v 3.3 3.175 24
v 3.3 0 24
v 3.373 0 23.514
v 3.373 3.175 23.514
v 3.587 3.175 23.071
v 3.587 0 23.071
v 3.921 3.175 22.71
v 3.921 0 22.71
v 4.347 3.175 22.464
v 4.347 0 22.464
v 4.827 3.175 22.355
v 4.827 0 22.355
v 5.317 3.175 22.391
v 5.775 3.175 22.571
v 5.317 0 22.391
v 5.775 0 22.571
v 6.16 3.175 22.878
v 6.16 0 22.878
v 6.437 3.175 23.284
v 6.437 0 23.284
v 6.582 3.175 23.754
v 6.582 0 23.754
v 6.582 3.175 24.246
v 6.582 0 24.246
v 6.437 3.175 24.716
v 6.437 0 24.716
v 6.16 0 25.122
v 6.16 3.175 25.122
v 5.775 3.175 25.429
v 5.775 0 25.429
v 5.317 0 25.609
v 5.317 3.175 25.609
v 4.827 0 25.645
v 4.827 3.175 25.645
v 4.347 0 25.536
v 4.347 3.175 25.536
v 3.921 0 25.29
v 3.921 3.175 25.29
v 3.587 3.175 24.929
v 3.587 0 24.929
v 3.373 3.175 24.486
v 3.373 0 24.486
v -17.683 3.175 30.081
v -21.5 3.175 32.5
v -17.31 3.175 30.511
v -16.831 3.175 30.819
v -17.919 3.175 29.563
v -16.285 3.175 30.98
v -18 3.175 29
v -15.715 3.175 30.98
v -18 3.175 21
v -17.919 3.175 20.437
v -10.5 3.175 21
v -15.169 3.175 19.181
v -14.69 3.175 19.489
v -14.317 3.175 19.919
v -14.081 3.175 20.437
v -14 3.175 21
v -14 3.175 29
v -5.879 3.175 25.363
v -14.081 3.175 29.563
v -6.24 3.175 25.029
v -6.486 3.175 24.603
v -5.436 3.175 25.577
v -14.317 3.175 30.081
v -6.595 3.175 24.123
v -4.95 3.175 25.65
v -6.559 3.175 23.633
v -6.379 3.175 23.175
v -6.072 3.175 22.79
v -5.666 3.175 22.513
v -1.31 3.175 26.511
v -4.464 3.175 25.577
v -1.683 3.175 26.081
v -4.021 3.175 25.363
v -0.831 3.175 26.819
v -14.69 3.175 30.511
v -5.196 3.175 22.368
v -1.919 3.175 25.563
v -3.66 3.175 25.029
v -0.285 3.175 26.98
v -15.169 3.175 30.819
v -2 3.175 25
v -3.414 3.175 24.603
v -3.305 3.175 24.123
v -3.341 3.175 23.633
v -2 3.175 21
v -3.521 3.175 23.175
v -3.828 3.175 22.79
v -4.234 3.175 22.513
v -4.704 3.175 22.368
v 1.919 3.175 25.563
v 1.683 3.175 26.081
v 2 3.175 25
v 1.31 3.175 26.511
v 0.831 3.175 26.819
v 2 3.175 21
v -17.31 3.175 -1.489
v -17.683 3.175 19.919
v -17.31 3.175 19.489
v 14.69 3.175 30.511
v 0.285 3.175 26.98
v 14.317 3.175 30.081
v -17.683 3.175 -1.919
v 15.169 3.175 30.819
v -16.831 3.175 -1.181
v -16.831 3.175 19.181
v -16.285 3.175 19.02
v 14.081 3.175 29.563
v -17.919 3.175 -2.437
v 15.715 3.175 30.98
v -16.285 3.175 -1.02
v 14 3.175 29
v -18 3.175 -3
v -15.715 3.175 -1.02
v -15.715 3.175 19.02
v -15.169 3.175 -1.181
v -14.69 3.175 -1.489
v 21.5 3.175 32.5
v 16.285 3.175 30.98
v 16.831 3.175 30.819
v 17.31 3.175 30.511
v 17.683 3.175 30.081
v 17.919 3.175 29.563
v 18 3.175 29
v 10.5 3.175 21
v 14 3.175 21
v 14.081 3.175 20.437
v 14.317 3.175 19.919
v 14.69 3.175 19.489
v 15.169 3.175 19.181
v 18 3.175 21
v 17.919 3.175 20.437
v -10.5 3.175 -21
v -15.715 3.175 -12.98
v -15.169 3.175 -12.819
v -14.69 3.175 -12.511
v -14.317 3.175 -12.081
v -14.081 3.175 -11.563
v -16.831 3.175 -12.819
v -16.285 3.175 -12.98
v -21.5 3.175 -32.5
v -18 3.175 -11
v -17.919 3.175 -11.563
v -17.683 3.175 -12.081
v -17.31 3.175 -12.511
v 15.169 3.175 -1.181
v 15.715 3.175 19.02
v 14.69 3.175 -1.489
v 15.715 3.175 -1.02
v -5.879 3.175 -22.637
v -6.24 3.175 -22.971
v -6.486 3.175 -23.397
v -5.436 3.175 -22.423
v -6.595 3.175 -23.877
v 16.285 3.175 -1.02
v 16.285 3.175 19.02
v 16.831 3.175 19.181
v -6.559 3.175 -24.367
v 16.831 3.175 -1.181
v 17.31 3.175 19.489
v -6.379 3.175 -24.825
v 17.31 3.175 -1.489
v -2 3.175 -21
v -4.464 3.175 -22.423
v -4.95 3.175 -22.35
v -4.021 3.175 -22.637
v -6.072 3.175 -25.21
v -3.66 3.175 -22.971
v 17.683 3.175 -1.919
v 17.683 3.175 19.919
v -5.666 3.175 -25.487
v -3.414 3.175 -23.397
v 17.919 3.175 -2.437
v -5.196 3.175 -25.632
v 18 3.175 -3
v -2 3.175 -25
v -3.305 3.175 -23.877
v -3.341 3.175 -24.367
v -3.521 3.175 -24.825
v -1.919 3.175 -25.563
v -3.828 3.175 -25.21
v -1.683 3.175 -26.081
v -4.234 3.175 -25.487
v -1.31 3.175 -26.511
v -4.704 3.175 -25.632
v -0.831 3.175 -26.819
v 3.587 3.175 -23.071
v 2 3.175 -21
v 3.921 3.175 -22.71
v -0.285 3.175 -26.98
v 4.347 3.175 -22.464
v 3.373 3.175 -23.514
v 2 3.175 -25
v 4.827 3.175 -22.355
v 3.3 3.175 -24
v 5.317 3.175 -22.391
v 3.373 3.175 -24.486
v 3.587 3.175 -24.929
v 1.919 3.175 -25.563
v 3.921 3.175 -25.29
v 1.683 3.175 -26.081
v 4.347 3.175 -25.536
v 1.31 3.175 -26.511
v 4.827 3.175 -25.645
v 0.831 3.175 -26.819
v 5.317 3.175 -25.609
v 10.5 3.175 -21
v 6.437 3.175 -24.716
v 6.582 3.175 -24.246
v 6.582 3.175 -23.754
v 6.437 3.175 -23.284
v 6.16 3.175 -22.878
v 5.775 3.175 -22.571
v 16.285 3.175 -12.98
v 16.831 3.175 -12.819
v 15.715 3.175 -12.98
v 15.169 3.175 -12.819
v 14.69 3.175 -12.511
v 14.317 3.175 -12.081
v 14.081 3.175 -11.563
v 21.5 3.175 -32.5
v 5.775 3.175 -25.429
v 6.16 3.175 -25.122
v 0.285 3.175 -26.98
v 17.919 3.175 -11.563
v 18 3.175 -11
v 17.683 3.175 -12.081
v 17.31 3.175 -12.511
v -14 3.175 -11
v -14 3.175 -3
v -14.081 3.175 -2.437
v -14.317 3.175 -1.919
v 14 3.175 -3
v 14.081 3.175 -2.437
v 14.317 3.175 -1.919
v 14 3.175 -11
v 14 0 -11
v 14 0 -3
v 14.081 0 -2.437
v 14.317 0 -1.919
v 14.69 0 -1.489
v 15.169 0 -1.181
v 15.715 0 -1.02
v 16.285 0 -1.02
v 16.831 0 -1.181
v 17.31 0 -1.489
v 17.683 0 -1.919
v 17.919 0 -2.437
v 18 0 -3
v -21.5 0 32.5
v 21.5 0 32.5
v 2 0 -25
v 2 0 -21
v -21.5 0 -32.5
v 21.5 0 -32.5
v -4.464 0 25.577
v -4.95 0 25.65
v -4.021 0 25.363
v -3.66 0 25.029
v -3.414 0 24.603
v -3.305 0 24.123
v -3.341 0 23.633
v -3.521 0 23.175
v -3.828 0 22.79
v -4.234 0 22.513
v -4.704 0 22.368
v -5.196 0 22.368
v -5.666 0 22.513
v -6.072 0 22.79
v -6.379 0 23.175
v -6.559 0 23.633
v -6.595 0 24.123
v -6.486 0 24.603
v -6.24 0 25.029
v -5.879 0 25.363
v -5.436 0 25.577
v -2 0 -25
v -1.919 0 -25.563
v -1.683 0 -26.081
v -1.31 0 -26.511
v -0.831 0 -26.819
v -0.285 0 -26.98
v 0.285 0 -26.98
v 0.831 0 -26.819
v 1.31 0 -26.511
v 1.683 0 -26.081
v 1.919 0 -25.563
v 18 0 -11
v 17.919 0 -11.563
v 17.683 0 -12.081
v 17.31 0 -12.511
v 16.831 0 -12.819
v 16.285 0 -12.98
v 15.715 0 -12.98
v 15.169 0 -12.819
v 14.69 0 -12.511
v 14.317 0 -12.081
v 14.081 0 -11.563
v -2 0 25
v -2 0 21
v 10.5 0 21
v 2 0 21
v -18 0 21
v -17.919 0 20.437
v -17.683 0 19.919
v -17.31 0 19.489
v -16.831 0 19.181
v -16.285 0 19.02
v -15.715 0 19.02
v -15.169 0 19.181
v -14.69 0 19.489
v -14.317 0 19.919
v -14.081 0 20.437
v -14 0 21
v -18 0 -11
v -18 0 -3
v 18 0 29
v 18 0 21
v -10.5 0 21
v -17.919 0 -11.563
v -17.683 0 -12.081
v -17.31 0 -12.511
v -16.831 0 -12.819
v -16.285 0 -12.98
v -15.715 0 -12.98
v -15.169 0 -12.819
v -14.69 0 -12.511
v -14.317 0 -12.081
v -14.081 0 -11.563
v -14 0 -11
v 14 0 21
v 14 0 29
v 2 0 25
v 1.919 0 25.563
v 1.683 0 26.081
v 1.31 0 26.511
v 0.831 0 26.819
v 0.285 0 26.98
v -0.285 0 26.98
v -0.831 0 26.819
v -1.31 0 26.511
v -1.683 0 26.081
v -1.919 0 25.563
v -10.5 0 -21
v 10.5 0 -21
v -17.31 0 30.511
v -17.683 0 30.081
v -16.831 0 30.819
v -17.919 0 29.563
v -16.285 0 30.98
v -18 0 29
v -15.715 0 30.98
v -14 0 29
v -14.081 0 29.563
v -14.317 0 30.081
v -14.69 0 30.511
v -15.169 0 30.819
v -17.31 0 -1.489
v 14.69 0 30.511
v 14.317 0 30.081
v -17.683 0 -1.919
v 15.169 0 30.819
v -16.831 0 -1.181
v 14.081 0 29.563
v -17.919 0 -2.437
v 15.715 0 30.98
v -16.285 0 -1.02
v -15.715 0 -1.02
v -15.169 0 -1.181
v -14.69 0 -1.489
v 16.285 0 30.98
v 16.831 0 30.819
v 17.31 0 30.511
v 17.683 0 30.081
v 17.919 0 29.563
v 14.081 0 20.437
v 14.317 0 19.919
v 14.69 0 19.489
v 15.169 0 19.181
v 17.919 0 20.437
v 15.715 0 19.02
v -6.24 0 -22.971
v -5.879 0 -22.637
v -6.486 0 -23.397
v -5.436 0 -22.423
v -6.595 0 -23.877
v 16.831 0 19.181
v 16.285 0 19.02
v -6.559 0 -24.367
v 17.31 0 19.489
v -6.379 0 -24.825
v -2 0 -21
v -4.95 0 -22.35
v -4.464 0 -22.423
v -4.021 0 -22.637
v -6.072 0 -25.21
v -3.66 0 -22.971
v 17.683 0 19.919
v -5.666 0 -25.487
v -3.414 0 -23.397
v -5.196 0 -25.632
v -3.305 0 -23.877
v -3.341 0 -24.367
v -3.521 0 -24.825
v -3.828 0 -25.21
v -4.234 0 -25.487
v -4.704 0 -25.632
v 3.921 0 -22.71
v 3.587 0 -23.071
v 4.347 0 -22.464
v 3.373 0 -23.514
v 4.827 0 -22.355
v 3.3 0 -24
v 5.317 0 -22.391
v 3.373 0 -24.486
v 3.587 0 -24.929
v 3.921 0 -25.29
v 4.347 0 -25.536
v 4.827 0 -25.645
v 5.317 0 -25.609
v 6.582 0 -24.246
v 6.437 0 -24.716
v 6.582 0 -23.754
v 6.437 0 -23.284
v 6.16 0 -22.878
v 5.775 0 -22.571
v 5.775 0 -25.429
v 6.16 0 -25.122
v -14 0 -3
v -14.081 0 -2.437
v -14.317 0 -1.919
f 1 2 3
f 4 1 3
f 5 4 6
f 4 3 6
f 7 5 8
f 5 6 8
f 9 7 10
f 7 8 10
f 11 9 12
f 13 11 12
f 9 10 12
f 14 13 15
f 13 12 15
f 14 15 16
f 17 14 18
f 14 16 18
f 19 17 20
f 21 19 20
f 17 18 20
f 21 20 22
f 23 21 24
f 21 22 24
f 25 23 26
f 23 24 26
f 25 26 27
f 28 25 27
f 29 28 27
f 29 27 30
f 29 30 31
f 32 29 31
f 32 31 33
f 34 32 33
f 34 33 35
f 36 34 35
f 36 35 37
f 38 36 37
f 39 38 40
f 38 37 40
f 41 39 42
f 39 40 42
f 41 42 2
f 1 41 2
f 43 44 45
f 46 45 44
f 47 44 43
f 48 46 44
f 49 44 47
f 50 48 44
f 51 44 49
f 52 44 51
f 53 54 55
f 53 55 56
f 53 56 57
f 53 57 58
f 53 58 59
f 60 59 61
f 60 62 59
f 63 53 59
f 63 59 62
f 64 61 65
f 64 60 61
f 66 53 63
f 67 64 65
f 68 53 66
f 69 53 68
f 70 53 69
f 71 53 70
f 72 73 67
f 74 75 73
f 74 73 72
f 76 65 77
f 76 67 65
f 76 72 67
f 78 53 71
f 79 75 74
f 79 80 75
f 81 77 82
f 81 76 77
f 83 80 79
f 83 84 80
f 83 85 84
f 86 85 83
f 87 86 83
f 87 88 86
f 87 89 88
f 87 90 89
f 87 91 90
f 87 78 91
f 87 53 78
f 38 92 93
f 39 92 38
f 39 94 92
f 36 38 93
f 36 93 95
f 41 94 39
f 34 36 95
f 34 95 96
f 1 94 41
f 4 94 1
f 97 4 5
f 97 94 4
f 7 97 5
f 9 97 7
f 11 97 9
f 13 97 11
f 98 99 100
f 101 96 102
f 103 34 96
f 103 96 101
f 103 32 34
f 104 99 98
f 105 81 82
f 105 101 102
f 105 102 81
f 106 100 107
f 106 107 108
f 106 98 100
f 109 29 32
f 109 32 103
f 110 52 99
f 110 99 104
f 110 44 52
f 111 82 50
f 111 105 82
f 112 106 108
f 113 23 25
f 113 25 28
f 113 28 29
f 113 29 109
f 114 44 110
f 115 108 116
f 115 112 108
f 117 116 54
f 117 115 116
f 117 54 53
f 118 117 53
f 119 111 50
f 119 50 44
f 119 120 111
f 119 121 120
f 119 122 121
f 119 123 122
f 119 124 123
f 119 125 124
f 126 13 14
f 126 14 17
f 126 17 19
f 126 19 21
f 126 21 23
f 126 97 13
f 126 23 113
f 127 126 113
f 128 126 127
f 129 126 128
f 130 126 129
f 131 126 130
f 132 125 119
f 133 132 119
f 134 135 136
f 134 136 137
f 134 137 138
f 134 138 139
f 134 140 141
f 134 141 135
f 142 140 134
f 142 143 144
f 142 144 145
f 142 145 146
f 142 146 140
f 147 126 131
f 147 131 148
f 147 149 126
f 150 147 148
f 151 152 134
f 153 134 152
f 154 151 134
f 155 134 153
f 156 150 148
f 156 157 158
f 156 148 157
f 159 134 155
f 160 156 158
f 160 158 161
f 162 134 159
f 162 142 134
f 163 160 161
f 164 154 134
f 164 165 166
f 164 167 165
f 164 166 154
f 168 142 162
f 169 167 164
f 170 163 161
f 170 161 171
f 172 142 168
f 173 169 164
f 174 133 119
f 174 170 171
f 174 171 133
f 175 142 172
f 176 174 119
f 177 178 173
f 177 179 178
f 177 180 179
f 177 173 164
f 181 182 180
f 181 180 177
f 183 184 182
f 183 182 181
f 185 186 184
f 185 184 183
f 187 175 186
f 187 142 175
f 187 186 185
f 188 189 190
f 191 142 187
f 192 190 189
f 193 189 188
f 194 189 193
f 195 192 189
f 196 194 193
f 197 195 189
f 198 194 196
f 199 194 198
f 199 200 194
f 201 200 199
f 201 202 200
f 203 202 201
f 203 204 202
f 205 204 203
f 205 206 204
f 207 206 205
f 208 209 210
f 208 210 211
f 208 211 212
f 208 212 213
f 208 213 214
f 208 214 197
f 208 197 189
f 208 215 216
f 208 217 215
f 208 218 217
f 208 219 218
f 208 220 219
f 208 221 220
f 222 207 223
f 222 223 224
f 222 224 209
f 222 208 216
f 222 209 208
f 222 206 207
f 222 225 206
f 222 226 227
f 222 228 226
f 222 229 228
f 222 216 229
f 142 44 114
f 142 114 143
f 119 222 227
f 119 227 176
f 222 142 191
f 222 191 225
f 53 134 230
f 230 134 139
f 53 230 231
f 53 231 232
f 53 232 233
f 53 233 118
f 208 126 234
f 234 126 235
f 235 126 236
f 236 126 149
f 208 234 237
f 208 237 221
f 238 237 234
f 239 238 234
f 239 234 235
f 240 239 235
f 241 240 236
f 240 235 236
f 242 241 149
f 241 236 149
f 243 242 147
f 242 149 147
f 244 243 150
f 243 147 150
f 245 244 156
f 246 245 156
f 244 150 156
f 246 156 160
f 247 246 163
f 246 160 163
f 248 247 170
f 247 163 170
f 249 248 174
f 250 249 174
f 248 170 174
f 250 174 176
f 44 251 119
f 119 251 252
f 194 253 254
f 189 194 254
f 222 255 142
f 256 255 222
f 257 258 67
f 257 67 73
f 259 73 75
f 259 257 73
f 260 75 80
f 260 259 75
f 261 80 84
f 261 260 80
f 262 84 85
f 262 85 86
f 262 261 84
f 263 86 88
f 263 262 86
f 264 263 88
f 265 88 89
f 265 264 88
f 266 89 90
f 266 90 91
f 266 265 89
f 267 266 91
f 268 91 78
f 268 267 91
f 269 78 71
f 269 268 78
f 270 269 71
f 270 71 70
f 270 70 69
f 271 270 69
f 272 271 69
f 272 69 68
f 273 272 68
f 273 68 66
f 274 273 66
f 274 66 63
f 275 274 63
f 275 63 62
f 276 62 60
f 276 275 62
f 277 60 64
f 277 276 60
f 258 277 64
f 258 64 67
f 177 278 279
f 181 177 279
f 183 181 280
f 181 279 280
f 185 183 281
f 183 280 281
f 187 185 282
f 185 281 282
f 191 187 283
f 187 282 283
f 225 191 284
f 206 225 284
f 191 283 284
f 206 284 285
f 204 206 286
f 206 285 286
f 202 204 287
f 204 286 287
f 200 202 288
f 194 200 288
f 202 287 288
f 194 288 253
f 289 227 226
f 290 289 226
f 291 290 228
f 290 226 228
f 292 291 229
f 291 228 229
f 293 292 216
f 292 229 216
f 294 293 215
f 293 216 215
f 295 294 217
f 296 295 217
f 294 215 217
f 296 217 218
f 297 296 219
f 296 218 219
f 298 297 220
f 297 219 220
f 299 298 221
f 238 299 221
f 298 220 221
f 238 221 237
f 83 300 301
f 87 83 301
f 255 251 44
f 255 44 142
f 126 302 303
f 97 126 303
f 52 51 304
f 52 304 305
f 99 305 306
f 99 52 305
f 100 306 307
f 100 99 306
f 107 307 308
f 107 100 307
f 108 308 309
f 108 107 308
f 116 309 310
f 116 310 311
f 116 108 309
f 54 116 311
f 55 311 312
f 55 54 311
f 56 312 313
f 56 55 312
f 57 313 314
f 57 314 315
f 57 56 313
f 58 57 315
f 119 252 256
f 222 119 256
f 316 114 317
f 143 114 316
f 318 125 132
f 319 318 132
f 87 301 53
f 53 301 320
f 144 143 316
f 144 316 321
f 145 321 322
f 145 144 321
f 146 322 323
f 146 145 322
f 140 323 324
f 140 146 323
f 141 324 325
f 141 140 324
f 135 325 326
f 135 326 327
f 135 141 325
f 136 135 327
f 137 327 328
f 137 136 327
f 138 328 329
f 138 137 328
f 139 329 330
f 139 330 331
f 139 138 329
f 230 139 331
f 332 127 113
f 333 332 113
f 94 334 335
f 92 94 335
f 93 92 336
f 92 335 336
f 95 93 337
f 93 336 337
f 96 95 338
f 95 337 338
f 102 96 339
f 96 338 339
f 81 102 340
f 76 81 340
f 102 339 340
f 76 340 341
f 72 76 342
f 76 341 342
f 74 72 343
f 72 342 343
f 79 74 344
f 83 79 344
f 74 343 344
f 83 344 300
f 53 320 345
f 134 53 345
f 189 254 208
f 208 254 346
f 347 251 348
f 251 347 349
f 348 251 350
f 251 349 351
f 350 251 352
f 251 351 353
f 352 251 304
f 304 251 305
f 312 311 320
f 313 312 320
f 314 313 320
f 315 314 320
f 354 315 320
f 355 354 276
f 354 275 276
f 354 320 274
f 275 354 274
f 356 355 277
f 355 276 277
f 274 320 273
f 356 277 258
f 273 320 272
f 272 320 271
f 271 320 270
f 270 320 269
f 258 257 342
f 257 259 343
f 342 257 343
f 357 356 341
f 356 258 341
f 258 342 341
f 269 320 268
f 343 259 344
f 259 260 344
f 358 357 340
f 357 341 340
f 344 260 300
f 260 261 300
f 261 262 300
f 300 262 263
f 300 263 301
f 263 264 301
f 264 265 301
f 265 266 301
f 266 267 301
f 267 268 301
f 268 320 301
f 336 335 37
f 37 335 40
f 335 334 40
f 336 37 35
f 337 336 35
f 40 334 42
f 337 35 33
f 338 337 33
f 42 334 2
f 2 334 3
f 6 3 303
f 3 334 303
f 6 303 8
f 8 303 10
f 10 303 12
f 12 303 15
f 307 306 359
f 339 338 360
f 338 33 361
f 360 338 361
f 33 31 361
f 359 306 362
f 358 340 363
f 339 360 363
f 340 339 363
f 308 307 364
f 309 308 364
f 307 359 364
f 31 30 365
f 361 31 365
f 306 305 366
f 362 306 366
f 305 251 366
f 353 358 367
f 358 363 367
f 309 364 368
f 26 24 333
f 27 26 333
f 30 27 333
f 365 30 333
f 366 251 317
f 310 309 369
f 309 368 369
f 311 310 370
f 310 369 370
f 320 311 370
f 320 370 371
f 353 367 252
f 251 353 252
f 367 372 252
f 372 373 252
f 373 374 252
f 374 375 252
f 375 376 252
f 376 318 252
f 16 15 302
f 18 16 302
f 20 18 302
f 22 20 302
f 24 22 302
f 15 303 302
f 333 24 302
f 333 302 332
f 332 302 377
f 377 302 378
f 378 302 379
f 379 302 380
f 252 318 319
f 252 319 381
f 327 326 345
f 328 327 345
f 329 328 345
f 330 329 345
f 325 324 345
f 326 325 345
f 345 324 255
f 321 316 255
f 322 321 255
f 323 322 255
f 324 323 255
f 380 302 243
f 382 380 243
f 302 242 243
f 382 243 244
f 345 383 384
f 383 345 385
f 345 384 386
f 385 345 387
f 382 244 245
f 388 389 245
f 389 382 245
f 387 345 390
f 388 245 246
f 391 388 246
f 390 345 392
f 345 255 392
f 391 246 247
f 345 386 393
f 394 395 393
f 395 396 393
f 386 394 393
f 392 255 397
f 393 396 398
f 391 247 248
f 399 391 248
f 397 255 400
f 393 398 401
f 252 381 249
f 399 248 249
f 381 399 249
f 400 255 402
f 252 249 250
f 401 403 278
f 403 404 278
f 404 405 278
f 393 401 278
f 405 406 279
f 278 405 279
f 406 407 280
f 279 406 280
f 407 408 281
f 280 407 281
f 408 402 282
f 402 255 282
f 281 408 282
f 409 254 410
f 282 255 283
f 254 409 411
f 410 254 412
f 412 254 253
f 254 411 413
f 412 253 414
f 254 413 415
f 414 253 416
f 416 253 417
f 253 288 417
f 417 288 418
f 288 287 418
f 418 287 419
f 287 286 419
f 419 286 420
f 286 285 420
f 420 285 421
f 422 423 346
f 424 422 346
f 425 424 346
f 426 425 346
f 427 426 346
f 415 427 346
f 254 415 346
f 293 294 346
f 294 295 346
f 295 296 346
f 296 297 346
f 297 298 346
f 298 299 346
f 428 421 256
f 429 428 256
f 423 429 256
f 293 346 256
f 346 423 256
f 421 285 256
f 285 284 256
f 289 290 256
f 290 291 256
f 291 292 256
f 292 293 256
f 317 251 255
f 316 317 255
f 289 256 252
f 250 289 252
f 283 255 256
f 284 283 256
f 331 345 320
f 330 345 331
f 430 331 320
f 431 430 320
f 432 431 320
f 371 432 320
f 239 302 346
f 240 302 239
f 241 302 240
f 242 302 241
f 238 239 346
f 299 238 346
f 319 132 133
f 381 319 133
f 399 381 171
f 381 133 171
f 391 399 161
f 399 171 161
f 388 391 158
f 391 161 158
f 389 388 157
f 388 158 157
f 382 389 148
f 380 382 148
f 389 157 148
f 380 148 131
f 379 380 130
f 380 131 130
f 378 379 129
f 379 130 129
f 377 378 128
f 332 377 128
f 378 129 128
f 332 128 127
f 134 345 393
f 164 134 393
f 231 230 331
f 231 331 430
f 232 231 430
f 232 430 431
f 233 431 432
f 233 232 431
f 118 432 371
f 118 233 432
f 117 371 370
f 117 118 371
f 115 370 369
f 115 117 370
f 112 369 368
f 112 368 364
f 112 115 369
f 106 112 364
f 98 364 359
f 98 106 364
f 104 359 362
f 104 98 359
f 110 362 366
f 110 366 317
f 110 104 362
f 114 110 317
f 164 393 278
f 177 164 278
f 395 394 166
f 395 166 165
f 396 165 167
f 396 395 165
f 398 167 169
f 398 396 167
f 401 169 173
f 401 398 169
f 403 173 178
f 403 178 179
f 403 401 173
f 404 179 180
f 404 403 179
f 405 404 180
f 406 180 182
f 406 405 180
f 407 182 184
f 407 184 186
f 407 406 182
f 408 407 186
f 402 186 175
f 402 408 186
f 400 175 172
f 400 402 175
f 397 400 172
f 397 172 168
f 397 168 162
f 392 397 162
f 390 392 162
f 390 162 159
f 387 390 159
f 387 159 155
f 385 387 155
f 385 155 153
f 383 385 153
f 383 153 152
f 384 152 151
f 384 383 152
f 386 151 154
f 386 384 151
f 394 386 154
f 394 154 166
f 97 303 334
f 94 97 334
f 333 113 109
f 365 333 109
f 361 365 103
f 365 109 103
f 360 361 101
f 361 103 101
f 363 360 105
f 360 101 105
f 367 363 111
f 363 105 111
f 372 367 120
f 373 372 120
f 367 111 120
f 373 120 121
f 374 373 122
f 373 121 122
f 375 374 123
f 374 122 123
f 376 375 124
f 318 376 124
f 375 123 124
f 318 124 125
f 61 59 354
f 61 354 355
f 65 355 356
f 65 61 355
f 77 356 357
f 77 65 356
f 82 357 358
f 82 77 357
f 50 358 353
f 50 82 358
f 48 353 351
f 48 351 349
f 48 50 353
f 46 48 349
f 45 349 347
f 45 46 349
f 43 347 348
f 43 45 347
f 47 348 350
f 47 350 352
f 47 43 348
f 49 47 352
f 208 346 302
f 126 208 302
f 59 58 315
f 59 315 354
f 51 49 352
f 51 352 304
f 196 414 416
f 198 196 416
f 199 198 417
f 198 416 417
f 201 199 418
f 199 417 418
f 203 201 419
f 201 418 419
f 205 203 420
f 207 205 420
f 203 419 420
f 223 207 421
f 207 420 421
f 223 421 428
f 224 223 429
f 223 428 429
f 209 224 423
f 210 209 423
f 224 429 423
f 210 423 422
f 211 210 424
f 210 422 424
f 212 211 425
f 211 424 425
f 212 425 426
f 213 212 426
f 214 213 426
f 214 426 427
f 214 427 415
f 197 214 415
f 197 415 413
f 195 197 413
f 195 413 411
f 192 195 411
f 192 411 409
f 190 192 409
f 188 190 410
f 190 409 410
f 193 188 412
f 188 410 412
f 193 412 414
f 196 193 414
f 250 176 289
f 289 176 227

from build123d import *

# Parameters (mm, degrees)
SKETCH1_W           = 43
SKETCH1_H           = 65
SKETCH1_R           = 1.65
BOSS_EXTRUDE1_DEPTH = 3.175
CUT_EXTRUDE1_DEPTH  = 3.175


with BuildPart() as part:
    # Sketch1 → Boss-Extrude1 (new body)
    with BuildSketch(Plane(origin=(0, 0, 0), x_dir=(1, 0, 0), z_dir=(0, 1, 0))):
        Rectangle(SKETCH1_W, SKETCH1_H)
        with Locations(Location((-4.95, -24, 0), (0, 0, 270))):
            Circle(SKETCH1_R, mode=Mode.SUBTRACT)
        with BuildLine():
            Line((-10.5, 21), (-2, 21))
            Line((-2, 21), (-2, 24))
            Line((-2, 24), (-2, 25))
            ThreePointArc((-2, 25), (0, 27), (2, 25))
            Line((2, 25), (2, 24))
            Line((2, 24), (2, 21))
            Line((2, 21), (10.5, 21))
            Line((10.5, 21), (10.5, 0))
            Line((10.5, 0), (10.5, -21))
            Line((10.5, -21), (2, -21))
            Line((2, -21), (2, -24))
            Line((2, -24), (2, -25))
            ThreePointArc((2, -25), (0, -27), (-2, -25))
            Line((-2, -25), (-2, -24))
            Line((-2, -24), (-2, -21))
            Line((-2, -21), (-10.5, -21))
            Line((-10.5, -21), (-10.5, 0))
            Line((-10.5, 0), (-10.5, 21))
        make_face(mode=Mode.SUBTRACT)
        with BuildLine():
            ThreePointArc((6.6, -24), (4.95, -25.65), (3.3, -24))
            ThreePointArc((3.3, -24), (4.95, -22.35), (6.6, -24))
        make_face(mode=Mode.SUBTRACT)
        with Locations(Location((-4.95, 24, 0), (0, 0, 270))):
            Circle(SKETCH1_R, mode=Mode.SUBTRACT)
        with BuildLine():
            ThreePointArc((6.6, 24), (4.95, 22.35), (3.3, 24))
            ThreePointArc((3.3, 24), (4.95, 25.65), (6.6, 24))
        make_face(mode=Mode.SUBTRACT)
    extrude(amount=BOSS_EXTRUDE1_DEPTH)

    # Sketch3 → Cut-Extrude1 (cut)
    with BuildSketch(Plane(origin=(0, 3.175, 0), x_dir=(1, 0, 0), z_dir=(0, 1, 0))):
        with BuildLine():
            Line((-14, -21), (-14, -29))
            ThreePointArc((-14, -29), (-16, -31), (-18, -29))
            Line((-18, -29), (-18, -21))
            ThreePointArc((-18, -21), (-16, -19), (-14, -21))
        make_face()
        with BuildLine():
            Line((14, -21), (14, -29))
            ThreePointArc((14, -29), (16, -31), (18, -29))
            Line((18, -29), (18, -21))
            ThreePointArc((18, -21), (16, -19), (14, -21))
        make_face()
        with BuildLine():
            Line((-14, 11), (-14, 3))
            ThreePointArc((-14, 3), (-16, 1), (-18, 3))
            Line((-18, 3), (-18, 11))
            ThreePointArc((-18, 11), (-16, 13), (-14, 11))
        make_face()
        with BuildLine():
            Line((14, 11), (14, 3))
            ThreePointArc((14, 3), (16, 1), (18, 3))
            Line((18, 3), (18, 11))
            ThreePointArc((18, 11), (16, 13), (14, 11))
        make_face()
    extrude(amount=-CUT_EXTRUDE1_DEPTH, mode=Mode.SUBTRACT)


solid = part.part
